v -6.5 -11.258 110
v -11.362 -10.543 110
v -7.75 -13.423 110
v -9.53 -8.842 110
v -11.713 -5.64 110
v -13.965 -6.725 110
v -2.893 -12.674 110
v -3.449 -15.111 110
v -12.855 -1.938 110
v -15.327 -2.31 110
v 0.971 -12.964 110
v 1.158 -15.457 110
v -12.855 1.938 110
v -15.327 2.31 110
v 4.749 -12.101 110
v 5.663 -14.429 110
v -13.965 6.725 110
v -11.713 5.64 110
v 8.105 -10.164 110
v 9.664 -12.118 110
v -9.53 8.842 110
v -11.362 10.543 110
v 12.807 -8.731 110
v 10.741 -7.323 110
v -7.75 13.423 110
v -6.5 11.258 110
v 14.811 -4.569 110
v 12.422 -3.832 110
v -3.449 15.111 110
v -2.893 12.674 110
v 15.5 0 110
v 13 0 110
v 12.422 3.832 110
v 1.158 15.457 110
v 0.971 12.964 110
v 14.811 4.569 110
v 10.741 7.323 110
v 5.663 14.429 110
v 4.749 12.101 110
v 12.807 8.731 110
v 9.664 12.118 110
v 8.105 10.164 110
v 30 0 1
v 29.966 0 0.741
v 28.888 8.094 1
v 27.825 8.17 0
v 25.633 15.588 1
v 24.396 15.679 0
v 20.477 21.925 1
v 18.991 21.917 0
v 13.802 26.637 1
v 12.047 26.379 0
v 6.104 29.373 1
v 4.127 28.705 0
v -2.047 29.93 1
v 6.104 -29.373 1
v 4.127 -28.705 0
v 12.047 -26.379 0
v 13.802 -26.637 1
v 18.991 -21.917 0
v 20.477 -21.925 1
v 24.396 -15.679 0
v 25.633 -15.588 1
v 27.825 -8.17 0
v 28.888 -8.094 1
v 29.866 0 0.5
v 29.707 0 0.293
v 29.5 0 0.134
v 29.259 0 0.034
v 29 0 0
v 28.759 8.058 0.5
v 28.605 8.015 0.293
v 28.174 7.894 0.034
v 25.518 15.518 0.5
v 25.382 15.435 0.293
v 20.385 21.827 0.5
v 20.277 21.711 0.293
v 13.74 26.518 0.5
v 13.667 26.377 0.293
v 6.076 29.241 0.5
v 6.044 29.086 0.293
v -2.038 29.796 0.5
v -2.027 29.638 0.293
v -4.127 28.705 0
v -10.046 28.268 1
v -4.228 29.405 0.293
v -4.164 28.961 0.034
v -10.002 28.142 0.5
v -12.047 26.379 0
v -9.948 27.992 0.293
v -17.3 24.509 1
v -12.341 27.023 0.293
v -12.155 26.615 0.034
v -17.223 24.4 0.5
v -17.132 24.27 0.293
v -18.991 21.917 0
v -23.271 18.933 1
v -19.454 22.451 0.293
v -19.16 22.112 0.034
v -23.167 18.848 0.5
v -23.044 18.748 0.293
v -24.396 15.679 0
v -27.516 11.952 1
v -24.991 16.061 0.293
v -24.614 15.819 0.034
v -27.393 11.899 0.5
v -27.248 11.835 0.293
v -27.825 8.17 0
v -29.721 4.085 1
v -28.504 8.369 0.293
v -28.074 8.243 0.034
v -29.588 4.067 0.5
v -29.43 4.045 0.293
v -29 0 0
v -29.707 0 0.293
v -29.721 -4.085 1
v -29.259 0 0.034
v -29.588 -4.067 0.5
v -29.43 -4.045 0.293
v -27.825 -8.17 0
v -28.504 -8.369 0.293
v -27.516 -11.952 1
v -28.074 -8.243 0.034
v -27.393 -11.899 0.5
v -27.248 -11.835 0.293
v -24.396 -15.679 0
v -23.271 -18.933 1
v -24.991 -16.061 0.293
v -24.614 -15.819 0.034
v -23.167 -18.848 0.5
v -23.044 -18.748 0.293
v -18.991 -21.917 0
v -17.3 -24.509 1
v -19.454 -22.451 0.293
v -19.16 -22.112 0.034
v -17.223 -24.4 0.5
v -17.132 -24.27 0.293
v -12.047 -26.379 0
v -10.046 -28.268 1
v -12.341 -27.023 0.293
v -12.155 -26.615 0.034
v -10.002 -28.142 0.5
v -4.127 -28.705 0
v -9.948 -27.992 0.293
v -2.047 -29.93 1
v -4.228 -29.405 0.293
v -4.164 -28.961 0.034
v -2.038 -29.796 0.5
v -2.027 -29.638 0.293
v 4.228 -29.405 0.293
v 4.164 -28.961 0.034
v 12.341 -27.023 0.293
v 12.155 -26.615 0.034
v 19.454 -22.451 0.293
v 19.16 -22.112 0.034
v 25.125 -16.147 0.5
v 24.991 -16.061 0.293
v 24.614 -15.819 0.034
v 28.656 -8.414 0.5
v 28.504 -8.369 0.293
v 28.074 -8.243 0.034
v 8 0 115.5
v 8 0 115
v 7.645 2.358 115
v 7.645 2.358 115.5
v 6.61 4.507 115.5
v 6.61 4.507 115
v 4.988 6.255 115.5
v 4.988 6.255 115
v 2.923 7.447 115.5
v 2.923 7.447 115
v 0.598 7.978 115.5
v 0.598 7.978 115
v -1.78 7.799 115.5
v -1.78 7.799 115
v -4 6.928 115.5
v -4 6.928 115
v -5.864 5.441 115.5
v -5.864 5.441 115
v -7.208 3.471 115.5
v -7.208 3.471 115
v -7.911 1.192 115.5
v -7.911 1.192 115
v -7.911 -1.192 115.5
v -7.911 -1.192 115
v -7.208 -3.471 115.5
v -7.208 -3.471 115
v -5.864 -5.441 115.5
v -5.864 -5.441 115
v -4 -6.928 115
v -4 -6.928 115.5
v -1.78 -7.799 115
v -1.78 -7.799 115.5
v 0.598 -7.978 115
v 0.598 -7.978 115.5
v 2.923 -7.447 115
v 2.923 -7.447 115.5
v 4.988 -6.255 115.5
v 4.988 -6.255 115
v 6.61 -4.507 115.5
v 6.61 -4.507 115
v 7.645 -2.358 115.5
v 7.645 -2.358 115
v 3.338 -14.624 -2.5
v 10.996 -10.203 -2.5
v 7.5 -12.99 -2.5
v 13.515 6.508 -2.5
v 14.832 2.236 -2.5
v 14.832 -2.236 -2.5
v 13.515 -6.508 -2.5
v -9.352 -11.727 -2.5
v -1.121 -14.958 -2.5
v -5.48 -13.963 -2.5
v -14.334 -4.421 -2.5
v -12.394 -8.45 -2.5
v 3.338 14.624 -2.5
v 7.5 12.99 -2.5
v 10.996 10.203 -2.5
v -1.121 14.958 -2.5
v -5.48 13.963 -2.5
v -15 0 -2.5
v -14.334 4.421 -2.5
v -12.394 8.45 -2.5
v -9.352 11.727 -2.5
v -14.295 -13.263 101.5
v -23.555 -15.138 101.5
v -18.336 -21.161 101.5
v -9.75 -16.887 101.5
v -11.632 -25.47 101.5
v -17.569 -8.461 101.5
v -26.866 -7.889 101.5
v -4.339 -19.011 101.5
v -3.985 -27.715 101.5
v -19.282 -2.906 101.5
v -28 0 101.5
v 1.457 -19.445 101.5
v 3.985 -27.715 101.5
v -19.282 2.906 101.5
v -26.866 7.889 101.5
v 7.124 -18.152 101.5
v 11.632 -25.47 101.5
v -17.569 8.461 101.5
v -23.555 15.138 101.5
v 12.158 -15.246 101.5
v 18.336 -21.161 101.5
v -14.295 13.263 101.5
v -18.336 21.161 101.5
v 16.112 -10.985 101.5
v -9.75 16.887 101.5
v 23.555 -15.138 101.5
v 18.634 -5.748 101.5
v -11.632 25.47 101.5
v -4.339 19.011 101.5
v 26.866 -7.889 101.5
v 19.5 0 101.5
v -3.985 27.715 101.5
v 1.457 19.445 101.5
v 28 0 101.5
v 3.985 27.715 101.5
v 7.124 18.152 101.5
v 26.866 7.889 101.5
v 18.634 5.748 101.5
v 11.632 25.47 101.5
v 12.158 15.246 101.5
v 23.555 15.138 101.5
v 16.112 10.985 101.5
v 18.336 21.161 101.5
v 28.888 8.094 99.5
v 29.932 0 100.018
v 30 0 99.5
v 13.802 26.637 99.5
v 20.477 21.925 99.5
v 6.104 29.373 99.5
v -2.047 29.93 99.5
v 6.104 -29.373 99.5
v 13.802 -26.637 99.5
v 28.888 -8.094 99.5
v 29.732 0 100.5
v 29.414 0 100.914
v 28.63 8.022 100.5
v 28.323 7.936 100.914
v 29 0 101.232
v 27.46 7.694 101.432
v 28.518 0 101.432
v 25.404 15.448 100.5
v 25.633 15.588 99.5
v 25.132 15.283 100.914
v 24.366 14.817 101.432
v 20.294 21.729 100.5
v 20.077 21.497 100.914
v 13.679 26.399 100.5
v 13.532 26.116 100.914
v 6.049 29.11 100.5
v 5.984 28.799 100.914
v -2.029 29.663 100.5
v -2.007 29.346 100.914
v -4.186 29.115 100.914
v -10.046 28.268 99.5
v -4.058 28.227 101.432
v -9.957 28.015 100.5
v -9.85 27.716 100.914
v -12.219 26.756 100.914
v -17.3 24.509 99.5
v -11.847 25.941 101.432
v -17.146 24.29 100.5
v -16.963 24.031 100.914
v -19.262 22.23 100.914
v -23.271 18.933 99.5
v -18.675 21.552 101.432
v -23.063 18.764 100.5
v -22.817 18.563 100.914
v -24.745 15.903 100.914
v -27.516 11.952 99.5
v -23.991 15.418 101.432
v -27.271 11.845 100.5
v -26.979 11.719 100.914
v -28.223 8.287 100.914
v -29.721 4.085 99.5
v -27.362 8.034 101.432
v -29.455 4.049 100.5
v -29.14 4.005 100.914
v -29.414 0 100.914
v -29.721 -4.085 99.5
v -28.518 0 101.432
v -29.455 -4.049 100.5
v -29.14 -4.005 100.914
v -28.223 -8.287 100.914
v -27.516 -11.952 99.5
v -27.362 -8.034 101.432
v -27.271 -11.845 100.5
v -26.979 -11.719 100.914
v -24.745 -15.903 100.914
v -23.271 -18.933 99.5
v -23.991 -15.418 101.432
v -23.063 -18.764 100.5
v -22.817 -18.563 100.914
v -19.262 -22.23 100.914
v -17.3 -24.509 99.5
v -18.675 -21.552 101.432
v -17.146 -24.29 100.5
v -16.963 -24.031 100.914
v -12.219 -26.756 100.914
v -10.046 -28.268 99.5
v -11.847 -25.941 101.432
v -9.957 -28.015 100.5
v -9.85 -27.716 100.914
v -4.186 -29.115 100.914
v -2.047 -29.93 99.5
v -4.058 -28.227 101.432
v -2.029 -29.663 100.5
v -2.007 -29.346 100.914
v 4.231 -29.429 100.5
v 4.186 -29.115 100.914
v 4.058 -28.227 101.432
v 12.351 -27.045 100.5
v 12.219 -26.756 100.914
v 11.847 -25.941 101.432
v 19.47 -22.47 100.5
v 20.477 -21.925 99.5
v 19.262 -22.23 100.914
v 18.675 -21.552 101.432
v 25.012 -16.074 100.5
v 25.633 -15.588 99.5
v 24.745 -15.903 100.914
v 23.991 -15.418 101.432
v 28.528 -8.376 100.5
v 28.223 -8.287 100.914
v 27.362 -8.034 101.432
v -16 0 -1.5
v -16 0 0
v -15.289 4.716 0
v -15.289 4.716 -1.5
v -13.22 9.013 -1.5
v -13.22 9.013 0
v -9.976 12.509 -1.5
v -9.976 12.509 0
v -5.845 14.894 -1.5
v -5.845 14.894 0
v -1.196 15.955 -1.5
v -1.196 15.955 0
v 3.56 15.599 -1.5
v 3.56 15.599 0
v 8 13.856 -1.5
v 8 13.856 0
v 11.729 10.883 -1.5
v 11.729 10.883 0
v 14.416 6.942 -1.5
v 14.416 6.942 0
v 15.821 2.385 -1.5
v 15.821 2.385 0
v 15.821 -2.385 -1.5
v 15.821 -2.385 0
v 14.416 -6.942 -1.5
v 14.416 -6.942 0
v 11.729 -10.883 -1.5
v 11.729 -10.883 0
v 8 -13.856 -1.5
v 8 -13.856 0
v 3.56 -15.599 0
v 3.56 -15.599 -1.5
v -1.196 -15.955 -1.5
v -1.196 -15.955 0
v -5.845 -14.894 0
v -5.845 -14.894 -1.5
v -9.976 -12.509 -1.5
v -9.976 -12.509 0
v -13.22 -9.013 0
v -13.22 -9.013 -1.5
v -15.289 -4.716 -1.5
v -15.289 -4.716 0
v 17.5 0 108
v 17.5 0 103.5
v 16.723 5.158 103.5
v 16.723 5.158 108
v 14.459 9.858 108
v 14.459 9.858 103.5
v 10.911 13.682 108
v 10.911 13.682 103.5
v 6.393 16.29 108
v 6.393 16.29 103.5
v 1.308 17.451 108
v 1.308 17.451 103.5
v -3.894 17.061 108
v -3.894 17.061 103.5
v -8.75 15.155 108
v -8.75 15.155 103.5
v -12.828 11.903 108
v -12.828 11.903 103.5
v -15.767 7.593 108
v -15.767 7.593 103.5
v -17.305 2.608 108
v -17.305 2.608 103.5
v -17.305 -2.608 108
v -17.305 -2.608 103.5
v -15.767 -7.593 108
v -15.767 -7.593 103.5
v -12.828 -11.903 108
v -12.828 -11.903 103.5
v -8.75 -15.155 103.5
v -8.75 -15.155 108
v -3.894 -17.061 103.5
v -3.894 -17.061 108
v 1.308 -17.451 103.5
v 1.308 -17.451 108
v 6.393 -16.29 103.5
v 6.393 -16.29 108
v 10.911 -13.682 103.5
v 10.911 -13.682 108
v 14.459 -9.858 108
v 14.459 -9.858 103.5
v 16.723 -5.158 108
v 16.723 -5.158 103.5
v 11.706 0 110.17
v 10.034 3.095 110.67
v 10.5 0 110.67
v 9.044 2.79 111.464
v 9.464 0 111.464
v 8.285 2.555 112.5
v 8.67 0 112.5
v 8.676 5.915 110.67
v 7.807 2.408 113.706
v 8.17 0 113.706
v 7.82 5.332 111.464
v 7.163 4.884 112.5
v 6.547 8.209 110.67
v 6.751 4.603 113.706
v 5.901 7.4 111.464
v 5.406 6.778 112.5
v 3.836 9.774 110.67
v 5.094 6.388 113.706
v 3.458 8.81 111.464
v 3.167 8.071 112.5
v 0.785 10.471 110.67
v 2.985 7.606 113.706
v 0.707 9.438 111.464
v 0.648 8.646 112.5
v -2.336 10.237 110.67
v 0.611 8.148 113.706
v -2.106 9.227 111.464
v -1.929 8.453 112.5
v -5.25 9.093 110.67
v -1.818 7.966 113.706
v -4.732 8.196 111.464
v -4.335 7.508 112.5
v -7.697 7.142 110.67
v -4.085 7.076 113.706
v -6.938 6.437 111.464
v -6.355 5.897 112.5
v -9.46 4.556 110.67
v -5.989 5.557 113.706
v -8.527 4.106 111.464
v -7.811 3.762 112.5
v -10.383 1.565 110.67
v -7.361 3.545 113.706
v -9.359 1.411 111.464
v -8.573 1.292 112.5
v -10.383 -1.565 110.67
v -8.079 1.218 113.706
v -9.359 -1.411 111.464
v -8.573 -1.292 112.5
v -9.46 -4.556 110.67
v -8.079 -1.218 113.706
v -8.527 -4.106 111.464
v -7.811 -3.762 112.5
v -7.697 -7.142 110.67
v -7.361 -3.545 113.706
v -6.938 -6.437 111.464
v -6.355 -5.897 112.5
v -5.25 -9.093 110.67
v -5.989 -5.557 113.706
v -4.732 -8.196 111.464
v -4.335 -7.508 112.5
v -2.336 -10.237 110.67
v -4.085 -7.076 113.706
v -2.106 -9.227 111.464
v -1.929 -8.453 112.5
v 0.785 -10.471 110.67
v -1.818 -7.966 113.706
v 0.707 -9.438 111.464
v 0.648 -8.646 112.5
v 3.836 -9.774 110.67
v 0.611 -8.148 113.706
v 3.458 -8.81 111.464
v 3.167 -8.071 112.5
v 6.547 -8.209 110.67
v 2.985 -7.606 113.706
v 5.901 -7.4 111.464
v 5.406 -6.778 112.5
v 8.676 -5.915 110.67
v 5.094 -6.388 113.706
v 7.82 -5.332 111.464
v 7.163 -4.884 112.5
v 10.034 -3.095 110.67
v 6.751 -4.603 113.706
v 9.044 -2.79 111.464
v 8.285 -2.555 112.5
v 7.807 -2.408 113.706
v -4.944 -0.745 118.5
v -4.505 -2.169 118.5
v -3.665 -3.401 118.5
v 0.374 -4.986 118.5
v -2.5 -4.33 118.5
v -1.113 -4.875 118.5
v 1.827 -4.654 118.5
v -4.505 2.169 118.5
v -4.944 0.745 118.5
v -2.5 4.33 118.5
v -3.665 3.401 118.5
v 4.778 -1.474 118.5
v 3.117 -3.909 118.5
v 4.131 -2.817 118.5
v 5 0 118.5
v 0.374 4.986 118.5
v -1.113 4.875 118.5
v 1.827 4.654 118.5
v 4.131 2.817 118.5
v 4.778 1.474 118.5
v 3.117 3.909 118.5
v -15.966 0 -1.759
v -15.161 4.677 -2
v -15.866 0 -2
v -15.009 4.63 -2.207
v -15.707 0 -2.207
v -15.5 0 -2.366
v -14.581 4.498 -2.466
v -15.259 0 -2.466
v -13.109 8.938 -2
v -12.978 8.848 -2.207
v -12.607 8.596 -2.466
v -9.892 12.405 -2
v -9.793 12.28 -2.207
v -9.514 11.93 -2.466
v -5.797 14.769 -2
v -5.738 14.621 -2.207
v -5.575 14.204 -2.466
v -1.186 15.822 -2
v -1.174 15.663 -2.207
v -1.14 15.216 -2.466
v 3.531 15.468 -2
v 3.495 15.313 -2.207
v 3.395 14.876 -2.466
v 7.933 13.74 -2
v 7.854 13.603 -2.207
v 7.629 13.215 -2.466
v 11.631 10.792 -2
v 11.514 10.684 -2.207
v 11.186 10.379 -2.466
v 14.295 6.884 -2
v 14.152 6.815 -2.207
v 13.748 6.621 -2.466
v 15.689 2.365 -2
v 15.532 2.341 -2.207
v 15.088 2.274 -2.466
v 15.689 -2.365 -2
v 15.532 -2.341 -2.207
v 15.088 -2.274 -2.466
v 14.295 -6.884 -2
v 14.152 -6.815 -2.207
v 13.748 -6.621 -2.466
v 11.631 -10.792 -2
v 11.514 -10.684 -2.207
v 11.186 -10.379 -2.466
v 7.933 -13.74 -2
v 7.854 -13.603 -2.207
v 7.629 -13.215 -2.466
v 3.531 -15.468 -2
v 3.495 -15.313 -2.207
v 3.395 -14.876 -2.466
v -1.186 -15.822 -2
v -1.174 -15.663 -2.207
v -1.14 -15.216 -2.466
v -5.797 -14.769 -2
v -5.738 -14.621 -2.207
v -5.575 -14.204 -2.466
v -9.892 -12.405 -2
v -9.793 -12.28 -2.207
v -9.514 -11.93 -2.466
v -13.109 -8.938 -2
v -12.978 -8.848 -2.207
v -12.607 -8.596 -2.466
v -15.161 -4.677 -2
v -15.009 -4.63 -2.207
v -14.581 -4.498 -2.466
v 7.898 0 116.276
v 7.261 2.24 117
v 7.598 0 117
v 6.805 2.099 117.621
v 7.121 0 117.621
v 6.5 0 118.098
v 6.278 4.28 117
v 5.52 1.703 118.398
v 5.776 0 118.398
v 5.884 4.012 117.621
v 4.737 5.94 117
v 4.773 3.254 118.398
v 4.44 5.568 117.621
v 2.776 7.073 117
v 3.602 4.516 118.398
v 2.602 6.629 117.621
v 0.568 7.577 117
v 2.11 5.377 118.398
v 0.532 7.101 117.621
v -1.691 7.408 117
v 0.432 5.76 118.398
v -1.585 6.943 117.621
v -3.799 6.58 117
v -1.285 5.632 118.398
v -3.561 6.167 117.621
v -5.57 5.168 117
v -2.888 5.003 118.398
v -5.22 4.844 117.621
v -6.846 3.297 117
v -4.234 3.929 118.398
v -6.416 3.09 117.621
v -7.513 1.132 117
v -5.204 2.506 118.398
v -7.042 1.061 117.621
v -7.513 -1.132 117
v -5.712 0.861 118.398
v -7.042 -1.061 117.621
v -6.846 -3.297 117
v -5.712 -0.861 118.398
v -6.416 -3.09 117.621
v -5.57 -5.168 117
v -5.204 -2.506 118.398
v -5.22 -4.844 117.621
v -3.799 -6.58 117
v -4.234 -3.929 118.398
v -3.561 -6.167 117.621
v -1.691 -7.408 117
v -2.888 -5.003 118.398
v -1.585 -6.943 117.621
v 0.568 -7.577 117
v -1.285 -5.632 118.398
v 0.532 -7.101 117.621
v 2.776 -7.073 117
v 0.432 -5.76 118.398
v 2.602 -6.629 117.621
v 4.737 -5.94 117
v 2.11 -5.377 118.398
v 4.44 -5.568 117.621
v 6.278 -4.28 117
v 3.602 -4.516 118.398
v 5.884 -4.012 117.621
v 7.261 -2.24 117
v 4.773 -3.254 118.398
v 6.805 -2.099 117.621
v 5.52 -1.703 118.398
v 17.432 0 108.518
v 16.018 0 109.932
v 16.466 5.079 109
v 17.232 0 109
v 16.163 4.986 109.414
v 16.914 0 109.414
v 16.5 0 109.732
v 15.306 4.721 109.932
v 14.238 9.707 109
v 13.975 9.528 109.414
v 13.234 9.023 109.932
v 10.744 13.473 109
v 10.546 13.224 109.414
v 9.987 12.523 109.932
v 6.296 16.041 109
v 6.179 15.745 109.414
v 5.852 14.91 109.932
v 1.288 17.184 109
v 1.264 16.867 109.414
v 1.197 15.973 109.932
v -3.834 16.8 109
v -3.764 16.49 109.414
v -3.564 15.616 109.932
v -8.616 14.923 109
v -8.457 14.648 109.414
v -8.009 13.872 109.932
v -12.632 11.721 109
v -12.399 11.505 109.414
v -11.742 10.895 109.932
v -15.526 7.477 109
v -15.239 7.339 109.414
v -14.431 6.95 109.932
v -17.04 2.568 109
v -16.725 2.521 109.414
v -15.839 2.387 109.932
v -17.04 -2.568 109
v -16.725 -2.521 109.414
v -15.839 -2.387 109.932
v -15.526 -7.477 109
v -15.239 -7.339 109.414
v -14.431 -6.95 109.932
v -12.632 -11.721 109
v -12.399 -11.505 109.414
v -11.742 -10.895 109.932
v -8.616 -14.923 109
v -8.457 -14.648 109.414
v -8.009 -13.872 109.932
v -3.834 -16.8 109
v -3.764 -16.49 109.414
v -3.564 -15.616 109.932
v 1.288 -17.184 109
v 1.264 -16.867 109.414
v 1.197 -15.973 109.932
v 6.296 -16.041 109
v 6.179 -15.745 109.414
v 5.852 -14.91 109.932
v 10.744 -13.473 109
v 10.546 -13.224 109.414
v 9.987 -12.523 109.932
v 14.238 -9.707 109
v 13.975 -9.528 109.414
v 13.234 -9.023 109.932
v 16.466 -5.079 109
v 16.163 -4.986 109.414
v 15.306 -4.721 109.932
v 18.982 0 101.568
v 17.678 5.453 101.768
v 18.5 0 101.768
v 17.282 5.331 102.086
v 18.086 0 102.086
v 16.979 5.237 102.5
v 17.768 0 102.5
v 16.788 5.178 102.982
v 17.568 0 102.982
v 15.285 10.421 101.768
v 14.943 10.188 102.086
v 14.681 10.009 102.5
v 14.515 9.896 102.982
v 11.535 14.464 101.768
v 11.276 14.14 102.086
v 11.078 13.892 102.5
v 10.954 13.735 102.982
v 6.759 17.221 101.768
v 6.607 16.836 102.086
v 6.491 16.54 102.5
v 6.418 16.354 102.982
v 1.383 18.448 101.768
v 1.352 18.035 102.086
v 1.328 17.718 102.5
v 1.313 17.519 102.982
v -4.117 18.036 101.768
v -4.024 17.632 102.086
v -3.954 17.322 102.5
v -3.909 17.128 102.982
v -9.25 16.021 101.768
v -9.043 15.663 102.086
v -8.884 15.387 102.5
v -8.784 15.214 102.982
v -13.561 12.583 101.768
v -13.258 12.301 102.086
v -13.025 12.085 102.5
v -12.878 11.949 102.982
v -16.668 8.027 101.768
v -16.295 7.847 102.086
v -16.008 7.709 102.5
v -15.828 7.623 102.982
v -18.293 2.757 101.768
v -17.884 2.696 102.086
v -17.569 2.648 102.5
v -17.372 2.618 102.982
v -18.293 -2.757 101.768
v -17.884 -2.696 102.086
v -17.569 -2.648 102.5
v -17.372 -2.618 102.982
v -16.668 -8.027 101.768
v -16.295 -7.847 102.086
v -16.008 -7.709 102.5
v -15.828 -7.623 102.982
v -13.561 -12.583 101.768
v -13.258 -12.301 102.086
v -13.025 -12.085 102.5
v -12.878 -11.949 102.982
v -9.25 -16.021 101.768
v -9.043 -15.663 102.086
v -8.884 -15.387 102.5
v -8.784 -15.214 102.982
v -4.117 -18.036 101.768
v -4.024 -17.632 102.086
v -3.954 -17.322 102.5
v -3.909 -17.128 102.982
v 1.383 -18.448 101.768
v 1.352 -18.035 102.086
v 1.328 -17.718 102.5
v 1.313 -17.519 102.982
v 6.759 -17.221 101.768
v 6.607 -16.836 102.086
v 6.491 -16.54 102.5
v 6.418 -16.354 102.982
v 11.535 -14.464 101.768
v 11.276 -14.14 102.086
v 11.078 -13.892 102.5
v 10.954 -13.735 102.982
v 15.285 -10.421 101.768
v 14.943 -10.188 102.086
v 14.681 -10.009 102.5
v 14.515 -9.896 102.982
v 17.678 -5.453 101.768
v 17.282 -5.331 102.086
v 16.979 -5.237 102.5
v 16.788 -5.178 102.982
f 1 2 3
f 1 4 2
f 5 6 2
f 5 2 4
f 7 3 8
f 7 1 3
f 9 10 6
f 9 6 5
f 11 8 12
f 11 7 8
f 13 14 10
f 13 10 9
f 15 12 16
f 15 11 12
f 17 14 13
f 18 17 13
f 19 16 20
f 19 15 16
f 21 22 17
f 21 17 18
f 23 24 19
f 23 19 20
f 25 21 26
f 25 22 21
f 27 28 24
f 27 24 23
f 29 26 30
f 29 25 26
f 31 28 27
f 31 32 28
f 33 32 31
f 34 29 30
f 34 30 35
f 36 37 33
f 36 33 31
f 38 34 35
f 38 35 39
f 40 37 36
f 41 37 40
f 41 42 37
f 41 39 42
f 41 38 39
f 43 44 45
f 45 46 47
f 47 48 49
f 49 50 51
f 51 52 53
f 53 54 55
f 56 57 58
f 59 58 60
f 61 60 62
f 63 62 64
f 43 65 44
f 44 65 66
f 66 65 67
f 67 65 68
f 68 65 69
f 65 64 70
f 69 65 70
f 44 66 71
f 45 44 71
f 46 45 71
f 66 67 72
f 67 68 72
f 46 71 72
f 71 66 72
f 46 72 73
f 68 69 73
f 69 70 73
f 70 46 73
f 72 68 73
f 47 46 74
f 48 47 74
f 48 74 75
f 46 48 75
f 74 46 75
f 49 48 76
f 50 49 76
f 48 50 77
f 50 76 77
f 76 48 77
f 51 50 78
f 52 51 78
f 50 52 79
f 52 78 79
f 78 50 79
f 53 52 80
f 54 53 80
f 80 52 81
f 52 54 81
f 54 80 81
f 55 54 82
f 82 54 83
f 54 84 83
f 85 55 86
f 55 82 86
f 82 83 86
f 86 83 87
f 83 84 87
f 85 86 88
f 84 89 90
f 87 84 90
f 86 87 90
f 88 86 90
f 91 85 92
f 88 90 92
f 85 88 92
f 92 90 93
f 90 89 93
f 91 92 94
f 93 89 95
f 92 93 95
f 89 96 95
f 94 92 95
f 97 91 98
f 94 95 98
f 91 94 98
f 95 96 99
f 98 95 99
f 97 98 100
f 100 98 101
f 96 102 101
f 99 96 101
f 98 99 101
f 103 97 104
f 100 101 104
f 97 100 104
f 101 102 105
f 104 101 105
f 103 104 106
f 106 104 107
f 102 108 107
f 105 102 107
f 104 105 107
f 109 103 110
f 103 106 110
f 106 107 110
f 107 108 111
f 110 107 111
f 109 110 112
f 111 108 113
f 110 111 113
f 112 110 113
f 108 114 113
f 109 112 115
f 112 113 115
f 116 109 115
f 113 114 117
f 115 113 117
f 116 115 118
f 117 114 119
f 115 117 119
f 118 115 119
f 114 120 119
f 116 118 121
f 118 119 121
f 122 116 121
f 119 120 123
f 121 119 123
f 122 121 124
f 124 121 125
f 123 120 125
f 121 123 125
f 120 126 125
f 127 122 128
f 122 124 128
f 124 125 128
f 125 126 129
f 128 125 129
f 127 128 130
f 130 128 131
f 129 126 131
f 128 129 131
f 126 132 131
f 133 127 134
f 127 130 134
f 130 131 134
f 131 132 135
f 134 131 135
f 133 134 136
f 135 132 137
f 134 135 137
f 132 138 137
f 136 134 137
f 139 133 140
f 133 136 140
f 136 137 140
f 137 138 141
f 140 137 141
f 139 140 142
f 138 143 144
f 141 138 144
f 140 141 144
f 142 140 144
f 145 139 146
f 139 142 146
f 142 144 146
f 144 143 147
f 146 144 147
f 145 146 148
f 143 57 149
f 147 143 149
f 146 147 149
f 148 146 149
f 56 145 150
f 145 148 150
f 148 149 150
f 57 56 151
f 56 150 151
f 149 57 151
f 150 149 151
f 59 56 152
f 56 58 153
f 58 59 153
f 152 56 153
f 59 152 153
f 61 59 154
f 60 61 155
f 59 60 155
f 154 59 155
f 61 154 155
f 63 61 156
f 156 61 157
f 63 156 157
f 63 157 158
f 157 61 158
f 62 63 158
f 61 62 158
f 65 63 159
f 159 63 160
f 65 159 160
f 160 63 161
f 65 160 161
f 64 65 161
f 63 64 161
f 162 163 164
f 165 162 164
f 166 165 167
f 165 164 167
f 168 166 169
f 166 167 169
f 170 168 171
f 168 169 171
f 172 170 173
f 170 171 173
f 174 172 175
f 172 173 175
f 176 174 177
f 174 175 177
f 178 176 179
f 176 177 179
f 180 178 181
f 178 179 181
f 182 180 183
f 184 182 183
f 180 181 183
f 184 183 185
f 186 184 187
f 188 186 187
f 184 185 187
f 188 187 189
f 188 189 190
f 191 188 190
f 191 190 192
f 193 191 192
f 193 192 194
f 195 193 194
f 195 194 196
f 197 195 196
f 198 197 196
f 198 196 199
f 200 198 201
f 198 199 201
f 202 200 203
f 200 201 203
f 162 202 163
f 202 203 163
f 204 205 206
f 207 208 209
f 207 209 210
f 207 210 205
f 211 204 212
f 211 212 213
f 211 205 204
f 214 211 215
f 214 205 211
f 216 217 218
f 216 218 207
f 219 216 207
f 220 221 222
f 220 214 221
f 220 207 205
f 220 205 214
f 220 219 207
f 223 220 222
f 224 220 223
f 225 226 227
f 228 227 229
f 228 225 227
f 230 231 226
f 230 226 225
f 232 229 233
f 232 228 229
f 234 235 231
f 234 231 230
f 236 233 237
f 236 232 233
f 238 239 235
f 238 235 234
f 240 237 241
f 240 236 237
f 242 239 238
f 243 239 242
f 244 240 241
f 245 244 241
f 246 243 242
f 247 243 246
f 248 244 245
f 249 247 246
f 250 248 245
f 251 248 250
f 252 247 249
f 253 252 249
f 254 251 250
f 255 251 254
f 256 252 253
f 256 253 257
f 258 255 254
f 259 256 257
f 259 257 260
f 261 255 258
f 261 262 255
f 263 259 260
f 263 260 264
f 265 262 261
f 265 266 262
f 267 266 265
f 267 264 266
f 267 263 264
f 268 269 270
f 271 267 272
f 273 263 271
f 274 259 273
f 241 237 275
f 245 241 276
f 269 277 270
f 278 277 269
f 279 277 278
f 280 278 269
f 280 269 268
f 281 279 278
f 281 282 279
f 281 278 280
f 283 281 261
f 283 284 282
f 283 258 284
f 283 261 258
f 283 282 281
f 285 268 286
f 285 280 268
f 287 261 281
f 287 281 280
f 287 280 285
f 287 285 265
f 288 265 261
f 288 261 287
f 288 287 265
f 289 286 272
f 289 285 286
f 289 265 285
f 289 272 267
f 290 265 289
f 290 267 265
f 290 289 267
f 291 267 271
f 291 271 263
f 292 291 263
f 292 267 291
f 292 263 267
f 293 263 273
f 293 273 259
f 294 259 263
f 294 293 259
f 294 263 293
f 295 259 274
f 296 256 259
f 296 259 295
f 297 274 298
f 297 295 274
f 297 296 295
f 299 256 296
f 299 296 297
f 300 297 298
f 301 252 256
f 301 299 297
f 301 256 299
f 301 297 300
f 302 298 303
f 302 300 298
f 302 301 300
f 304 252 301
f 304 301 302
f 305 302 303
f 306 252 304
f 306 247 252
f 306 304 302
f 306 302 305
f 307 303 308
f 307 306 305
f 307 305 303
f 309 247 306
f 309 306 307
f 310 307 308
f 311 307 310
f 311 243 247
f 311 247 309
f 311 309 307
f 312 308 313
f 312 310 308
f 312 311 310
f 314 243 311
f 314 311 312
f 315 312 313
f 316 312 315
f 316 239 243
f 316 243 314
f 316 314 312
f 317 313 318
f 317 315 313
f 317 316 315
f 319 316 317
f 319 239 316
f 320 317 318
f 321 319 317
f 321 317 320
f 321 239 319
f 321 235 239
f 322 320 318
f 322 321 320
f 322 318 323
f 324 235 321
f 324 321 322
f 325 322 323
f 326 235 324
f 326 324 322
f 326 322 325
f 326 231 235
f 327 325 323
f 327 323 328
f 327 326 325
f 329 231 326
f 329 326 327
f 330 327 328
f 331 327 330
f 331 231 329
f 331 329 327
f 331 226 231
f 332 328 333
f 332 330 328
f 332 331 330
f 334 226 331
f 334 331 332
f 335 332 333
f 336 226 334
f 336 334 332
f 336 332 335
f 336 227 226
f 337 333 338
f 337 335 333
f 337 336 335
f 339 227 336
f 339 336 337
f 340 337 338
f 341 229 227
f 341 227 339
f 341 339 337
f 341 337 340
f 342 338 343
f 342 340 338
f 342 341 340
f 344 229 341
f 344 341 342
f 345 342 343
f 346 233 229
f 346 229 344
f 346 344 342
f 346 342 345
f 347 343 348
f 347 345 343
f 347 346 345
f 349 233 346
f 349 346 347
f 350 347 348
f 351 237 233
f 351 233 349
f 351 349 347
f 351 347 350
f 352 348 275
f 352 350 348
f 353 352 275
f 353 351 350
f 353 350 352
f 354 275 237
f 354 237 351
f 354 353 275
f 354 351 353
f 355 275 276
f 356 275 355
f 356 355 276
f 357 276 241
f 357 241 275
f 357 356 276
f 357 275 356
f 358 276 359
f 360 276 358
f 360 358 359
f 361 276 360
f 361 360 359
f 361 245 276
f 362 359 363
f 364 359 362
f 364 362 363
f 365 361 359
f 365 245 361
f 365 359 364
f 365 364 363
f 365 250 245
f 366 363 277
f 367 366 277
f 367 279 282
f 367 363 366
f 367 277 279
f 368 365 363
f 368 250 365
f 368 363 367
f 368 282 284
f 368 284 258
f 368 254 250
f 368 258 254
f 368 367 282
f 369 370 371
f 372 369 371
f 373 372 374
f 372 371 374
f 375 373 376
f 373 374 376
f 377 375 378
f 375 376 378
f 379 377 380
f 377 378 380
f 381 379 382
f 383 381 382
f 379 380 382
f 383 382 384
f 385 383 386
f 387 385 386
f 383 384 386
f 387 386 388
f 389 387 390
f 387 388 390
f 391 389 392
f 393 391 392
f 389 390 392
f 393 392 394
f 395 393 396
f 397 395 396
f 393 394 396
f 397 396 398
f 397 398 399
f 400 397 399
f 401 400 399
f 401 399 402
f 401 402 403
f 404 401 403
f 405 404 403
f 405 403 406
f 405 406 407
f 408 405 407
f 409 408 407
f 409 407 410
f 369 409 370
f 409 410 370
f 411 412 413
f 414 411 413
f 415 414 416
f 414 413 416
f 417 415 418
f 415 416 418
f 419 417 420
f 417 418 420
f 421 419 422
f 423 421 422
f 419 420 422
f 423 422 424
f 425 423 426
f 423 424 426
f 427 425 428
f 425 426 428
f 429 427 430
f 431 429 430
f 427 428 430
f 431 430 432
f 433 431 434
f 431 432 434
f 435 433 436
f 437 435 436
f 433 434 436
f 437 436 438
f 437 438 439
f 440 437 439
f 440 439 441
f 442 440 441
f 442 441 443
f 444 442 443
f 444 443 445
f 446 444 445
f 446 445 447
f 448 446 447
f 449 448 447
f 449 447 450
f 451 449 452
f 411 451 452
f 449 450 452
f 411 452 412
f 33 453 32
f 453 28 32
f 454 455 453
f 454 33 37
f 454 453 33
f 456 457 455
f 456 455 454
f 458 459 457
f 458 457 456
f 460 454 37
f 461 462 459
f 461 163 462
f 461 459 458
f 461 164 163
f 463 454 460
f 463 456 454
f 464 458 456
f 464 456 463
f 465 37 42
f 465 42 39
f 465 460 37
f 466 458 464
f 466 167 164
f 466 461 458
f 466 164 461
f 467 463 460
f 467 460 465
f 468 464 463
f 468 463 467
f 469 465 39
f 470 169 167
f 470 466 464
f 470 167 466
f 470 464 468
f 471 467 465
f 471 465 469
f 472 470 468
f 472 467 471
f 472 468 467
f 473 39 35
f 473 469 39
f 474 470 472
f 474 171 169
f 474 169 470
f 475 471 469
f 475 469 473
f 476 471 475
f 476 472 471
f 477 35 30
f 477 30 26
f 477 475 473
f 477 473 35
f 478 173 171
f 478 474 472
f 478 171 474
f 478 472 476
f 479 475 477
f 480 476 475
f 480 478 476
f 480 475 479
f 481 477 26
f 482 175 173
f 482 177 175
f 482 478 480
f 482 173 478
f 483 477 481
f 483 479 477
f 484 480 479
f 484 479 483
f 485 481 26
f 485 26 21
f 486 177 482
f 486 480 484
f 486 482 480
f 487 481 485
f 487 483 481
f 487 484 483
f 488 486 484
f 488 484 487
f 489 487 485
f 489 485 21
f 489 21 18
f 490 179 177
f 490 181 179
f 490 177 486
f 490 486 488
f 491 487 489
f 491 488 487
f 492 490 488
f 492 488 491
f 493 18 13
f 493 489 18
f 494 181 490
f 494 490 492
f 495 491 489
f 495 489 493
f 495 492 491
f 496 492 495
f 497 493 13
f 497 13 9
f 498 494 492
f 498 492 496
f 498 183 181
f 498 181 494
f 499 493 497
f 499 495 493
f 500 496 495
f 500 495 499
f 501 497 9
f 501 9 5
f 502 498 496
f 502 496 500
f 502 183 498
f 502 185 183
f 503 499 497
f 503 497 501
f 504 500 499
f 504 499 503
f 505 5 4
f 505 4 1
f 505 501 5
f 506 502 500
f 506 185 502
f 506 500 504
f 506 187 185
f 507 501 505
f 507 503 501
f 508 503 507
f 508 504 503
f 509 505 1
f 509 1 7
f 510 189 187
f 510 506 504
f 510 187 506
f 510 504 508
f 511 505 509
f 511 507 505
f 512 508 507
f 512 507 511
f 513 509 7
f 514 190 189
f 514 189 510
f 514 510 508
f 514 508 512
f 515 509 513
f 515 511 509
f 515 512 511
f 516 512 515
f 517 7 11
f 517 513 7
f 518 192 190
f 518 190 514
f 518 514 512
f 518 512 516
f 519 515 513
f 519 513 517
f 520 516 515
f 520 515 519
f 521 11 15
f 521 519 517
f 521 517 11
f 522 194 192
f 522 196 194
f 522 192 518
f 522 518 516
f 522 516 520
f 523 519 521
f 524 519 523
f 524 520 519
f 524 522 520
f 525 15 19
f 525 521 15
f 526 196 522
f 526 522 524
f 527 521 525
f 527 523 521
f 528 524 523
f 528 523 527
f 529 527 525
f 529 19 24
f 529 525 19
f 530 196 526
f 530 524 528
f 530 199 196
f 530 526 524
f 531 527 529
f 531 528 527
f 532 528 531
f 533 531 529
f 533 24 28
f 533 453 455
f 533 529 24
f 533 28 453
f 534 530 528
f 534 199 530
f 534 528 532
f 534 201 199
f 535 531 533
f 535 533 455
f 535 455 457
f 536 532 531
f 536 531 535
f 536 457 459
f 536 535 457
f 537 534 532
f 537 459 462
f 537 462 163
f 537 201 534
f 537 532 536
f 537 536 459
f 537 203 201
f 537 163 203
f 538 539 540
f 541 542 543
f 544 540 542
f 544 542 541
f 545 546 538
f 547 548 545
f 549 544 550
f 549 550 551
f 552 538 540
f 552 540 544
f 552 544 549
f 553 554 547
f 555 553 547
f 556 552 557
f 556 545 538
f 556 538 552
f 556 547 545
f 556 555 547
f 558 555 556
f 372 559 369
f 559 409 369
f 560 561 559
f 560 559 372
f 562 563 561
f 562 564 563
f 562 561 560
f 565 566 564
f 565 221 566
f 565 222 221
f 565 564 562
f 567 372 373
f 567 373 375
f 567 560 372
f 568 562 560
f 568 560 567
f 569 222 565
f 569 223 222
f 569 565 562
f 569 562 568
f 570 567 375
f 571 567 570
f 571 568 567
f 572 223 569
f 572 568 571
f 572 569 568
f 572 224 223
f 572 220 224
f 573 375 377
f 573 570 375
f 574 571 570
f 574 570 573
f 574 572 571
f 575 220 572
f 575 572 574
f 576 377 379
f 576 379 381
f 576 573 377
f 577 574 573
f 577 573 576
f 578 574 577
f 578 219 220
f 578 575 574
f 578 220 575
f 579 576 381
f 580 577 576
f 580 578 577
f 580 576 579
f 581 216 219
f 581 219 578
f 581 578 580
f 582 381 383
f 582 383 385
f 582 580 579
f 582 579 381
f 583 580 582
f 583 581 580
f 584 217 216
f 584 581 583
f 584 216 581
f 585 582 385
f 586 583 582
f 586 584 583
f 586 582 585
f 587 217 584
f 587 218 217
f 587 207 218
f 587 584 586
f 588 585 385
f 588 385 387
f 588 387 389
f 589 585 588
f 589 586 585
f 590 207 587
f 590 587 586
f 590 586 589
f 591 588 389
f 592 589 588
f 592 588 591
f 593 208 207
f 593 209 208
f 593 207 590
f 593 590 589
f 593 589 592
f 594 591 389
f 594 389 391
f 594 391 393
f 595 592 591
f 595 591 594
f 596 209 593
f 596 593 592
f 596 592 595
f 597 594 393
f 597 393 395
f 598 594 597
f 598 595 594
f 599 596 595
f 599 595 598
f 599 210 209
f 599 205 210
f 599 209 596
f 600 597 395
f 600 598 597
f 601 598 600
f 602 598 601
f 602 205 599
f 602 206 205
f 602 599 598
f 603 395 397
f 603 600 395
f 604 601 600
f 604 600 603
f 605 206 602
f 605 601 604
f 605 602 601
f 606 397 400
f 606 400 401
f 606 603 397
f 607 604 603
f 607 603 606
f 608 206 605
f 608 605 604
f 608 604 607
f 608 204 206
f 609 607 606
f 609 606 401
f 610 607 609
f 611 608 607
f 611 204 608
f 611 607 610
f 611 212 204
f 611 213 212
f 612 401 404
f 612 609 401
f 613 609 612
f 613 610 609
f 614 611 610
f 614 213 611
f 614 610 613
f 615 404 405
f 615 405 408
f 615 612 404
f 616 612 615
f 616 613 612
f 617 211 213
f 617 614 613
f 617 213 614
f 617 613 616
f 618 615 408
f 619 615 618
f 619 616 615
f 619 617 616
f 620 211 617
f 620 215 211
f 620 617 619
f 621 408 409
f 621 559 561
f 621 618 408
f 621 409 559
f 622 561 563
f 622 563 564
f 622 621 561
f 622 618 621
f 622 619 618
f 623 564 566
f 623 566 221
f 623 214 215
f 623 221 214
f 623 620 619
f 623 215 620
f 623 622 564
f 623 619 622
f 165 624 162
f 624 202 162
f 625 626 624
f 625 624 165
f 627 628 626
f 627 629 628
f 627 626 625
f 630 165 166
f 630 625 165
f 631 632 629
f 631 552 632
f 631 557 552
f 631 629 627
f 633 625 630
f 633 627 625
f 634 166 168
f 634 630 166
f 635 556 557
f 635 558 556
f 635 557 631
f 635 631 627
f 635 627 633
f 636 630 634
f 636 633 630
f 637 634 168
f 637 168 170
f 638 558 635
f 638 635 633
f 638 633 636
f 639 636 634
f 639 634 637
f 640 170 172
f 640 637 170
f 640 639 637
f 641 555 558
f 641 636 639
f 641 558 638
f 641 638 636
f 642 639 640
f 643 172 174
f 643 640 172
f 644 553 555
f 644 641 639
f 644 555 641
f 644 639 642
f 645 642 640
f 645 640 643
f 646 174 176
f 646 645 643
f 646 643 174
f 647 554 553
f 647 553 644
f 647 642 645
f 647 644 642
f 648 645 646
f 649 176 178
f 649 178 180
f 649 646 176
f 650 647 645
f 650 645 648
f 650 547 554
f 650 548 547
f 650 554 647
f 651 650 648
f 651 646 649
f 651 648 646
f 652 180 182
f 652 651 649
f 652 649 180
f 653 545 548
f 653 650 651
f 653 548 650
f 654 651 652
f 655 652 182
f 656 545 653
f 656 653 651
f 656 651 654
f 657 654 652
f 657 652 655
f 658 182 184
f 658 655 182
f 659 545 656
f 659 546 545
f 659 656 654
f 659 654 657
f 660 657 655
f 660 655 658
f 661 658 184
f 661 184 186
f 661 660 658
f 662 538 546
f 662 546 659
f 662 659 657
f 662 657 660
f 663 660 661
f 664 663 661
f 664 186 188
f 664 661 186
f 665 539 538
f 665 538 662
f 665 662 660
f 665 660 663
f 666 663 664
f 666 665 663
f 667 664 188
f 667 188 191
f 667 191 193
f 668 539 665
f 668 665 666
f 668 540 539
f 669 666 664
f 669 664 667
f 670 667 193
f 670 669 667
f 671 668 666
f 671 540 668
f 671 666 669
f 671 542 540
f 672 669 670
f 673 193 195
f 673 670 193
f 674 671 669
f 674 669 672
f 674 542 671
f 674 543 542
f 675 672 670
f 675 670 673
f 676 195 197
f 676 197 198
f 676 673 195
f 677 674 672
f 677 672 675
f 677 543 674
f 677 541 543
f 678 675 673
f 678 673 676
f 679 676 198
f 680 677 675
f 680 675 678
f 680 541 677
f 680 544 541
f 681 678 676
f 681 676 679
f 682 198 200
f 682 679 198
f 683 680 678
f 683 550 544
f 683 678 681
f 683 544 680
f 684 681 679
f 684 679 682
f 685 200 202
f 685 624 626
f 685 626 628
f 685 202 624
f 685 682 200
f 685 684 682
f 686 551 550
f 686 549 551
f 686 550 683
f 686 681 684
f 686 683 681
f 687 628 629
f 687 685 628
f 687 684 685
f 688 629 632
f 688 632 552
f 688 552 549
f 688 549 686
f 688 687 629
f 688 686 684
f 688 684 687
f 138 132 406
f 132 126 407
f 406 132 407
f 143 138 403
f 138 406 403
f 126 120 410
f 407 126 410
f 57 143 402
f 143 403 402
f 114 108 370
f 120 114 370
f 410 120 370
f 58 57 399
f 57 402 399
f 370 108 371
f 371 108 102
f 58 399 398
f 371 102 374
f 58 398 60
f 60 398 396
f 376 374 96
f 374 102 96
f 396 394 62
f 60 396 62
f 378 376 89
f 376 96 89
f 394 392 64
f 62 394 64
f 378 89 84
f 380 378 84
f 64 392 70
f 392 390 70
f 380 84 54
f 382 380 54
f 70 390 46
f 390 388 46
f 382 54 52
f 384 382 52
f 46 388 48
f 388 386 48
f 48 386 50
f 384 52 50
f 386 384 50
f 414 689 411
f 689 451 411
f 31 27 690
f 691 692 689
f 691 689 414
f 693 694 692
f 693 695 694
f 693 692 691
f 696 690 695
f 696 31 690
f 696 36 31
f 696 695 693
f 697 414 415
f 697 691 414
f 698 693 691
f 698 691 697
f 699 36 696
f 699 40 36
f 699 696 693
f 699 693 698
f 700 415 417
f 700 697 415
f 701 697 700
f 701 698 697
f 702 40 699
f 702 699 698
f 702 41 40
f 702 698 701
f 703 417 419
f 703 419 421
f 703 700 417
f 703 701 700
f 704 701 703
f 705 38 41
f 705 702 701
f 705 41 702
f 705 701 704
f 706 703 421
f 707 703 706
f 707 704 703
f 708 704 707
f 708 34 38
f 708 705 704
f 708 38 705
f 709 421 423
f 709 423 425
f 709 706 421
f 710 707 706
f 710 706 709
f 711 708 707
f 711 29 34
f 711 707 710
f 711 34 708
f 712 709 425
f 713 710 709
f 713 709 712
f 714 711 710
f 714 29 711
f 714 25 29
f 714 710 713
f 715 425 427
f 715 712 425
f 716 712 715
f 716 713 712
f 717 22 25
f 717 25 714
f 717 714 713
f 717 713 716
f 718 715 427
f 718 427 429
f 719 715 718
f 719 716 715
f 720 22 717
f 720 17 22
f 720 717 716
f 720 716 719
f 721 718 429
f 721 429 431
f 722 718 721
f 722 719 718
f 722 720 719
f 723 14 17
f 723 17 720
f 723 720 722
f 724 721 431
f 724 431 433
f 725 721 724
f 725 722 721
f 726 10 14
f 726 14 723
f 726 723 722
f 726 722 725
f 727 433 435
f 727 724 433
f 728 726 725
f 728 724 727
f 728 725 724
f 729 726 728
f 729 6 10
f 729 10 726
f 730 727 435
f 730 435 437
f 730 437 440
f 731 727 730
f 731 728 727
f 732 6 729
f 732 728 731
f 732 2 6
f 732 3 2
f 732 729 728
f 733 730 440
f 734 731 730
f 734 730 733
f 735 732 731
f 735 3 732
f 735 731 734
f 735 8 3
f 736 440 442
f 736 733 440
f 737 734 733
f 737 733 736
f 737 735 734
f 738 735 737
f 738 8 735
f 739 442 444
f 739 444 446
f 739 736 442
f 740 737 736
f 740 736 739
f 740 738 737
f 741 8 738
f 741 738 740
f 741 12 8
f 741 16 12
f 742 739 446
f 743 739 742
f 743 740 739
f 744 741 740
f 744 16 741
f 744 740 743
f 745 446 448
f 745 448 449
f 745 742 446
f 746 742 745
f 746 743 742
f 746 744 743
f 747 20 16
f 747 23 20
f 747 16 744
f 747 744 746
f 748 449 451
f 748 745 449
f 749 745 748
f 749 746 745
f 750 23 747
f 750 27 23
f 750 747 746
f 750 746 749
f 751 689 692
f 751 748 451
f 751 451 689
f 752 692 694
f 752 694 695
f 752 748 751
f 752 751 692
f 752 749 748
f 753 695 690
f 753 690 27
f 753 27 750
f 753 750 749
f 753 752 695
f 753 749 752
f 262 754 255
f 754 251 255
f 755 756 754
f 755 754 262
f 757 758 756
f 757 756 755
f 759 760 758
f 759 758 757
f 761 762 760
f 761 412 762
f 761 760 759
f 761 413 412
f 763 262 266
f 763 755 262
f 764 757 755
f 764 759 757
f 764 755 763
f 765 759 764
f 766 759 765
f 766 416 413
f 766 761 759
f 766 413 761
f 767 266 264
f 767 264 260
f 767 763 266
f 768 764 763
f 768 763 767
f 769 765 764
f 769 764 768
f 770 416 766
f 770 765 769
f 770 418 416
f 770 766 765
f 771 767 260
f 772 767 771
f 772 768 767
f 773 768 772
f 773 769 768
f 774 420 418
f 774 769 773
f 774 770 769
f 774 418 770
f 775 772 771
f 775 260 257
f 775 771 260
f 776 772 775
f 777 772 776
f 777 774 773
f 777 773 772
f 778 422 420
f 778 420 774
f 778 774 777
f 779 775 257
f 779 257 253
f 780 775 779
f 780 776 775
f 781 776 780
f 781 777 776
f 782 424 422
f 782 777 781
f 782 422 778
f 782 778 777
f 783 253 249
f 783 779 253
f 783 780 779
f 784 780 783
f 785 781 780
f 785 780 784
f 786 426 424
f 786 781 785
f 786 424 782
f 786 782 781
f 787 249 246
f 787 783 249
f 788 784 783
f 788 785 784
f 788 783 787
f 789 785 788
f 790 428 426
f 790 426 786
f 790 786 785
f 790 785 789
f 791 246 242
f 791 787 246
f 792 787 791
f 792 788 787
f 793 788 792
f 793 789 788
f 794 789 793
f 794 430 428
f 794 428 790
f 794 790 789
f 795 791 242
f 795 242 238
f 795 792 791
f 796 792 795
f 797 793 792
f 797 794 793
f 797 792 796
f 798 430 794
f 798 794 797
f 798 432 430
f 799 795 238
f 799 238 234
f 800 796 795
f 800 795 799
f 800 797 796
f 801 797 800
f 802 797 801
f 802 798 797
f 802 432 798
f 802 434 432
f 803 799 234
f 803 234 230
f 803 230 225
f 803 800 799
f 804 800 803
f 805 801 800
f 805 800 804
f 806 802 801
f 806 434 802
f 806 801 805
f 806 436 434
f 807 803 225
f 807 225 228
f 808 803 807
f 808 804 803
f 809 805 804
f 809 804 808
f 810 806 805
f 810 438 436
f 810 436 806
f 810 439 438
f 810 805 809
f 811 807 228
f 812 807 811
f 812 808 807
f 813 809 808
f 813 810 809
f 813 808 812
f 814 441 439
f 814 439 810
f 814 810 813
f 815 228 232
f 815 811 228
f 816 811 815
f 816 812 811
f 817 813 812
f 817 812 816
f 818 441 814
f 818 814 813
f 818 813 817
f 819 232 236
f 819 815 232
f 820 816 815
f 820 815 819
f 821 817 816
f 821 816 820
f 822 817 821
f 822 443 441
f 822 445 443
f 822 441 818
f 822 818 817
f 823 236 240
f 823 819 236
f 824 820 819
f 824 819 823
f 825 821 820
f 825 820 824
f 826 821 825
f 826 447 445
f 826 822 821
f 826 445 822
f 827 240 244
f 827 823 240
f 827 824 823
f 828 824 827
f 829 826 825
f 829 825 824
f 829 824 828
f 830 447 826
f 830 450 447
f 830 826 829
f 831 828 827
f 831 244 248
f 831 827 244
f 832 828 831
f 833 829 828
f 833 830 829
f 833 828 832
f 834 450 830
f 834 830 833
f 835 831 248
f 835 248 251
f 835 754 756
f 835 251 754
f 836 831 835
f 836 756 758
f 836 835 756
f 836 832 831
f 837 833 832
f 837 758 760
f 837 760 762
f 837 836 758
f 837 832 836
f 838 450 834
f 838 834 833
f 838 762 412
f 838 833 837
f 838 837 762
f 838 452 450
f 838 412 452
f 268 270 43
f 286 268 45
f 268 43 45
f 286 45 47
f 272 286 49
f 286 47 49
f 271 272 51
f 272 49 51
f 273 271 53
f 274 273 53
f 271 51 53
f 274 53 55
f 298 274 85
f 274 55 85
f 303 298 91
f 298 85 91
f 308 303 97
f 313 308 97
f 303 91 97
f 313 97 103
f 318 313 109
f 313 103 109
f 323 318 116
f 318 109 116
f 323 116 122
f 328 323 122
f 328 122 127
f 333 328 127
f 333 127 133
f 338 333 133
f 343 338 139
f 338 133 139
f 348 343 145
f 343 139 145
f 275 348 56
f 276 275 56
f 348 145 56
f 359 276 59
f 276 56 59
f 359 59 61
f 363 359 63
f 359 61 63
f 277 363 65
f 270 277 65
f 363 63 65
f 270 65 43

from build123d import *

# Parameters (mm, degrees)
CROQUIS1_R              = 30
SALIENTE_EXTRUIR1_DEPTH = 101.5
CROQUIS2_R              = 17.5
SALIENTE_EXTRUIR2_DEPTH = 8.5
CROQUIS3_R              = 8
SALIENTE_EXTRUIR3_DEPTH = 8.5
CROQUIS4_R              = 16
SALIENTE_EXTRUIR4_DEPTH = 2.5
REDONDEO1_R             = 2
REDONDEO2_R             = 2
REDONDEO3_R             = 2
REDONDEO4_R             = 5
REDONDEO5_R             = 3
REDONDEO6_R             = 1
REDONDEO7_R             = 1


with BuildPart() as part:
    # Croquis1 → Saliente-Extruir1 (new body)
    with BuildSketch(Plane.XY):
        Circle(CROQUIS1_R)
    extrude(amount=SALIENTE_EXTRUIR1_DEPTH)

    # Croquis2 → Saliente-Extruir2 (add)
    with BuildSketch(Plane.XY.offset(101.5)):
        Circle(CROQUIS2_R)
    extrude(amount=SALIENTE_EXTRUIR2_DEPTH)

    # Croquis3 → Saliente-Extruir3 (add)
    with BuildSketch(Plane.XY.offset(110)):
        Circle(CROQUIS3_R)
    extrude(amount=SALIENTE_EXTRUIR3_DEPTH)

    # Croquis4 → Saliente-Extruir4 (add)
    with BuildSketch(Plane(origin=(0, 0, 0), x_dir=(-1, 0, 0), z_dir=(0, 0, -1))):
        Circle(CROQUIS4_R)
    extrude(amount=SALIENTE_EXTRUIR4_DEPTH)

    # Redondeo1
    redondeo1_edges = [part.edges().sort_by_distance(p)[0] for p in [
        (-30, 0, 101.5),
    ]]
    fillet(redondeo1_edges, radius=REDONDEO1_R)

    # Redondeo2
    redondeo2_edges = [part.edges().sort_by_distance(p)[0] for p in [
        (-17.5, 0, 101.5),
    ]]
    fillet(redondeo2_edges, radius=REDONDEO2_R)

    # Redondeo3
    redondeo3_edges = [part.edges().sort_by_distance(p)[0] for p in [
        (-17.5, 0, 110),
    ]]
    fillet(redondeo3_edges, radius=REDONDEO3_R)

    # Redondeo4
    redondeo4_edges = [part.edges().sort_by_distance(p)[0] for p in [
        (-8, 0, 110),
    ]]
    fillet(redondeo4_edges, radius=REDONDEO4_R)

    # Redondeo5
    redondeo5_edges = [part.edges().sort_by_distance(p)[0] for p in [
        (-8, 0, 118.5),
    ]]
    fillet(redondeo5_edges, radius=REDONDEO5_R)

    # Redondeo6
    redondeo6_edges = [part.edges().sort_by_distance(p)[0] for p in [
        (-30, 0, 0),
    ]]
    fillet(redondeo6_edges, radius=REDONDEO6_R)

    # Redondeo7
    redondeo7_edges = [part.edges().sort_by_distance(p)[0] for p in [
        (16, 0, -2.5),
    ]]
    fillet(redondeo7_edges, radius=REDONDEO7_R)


solid = part.part
